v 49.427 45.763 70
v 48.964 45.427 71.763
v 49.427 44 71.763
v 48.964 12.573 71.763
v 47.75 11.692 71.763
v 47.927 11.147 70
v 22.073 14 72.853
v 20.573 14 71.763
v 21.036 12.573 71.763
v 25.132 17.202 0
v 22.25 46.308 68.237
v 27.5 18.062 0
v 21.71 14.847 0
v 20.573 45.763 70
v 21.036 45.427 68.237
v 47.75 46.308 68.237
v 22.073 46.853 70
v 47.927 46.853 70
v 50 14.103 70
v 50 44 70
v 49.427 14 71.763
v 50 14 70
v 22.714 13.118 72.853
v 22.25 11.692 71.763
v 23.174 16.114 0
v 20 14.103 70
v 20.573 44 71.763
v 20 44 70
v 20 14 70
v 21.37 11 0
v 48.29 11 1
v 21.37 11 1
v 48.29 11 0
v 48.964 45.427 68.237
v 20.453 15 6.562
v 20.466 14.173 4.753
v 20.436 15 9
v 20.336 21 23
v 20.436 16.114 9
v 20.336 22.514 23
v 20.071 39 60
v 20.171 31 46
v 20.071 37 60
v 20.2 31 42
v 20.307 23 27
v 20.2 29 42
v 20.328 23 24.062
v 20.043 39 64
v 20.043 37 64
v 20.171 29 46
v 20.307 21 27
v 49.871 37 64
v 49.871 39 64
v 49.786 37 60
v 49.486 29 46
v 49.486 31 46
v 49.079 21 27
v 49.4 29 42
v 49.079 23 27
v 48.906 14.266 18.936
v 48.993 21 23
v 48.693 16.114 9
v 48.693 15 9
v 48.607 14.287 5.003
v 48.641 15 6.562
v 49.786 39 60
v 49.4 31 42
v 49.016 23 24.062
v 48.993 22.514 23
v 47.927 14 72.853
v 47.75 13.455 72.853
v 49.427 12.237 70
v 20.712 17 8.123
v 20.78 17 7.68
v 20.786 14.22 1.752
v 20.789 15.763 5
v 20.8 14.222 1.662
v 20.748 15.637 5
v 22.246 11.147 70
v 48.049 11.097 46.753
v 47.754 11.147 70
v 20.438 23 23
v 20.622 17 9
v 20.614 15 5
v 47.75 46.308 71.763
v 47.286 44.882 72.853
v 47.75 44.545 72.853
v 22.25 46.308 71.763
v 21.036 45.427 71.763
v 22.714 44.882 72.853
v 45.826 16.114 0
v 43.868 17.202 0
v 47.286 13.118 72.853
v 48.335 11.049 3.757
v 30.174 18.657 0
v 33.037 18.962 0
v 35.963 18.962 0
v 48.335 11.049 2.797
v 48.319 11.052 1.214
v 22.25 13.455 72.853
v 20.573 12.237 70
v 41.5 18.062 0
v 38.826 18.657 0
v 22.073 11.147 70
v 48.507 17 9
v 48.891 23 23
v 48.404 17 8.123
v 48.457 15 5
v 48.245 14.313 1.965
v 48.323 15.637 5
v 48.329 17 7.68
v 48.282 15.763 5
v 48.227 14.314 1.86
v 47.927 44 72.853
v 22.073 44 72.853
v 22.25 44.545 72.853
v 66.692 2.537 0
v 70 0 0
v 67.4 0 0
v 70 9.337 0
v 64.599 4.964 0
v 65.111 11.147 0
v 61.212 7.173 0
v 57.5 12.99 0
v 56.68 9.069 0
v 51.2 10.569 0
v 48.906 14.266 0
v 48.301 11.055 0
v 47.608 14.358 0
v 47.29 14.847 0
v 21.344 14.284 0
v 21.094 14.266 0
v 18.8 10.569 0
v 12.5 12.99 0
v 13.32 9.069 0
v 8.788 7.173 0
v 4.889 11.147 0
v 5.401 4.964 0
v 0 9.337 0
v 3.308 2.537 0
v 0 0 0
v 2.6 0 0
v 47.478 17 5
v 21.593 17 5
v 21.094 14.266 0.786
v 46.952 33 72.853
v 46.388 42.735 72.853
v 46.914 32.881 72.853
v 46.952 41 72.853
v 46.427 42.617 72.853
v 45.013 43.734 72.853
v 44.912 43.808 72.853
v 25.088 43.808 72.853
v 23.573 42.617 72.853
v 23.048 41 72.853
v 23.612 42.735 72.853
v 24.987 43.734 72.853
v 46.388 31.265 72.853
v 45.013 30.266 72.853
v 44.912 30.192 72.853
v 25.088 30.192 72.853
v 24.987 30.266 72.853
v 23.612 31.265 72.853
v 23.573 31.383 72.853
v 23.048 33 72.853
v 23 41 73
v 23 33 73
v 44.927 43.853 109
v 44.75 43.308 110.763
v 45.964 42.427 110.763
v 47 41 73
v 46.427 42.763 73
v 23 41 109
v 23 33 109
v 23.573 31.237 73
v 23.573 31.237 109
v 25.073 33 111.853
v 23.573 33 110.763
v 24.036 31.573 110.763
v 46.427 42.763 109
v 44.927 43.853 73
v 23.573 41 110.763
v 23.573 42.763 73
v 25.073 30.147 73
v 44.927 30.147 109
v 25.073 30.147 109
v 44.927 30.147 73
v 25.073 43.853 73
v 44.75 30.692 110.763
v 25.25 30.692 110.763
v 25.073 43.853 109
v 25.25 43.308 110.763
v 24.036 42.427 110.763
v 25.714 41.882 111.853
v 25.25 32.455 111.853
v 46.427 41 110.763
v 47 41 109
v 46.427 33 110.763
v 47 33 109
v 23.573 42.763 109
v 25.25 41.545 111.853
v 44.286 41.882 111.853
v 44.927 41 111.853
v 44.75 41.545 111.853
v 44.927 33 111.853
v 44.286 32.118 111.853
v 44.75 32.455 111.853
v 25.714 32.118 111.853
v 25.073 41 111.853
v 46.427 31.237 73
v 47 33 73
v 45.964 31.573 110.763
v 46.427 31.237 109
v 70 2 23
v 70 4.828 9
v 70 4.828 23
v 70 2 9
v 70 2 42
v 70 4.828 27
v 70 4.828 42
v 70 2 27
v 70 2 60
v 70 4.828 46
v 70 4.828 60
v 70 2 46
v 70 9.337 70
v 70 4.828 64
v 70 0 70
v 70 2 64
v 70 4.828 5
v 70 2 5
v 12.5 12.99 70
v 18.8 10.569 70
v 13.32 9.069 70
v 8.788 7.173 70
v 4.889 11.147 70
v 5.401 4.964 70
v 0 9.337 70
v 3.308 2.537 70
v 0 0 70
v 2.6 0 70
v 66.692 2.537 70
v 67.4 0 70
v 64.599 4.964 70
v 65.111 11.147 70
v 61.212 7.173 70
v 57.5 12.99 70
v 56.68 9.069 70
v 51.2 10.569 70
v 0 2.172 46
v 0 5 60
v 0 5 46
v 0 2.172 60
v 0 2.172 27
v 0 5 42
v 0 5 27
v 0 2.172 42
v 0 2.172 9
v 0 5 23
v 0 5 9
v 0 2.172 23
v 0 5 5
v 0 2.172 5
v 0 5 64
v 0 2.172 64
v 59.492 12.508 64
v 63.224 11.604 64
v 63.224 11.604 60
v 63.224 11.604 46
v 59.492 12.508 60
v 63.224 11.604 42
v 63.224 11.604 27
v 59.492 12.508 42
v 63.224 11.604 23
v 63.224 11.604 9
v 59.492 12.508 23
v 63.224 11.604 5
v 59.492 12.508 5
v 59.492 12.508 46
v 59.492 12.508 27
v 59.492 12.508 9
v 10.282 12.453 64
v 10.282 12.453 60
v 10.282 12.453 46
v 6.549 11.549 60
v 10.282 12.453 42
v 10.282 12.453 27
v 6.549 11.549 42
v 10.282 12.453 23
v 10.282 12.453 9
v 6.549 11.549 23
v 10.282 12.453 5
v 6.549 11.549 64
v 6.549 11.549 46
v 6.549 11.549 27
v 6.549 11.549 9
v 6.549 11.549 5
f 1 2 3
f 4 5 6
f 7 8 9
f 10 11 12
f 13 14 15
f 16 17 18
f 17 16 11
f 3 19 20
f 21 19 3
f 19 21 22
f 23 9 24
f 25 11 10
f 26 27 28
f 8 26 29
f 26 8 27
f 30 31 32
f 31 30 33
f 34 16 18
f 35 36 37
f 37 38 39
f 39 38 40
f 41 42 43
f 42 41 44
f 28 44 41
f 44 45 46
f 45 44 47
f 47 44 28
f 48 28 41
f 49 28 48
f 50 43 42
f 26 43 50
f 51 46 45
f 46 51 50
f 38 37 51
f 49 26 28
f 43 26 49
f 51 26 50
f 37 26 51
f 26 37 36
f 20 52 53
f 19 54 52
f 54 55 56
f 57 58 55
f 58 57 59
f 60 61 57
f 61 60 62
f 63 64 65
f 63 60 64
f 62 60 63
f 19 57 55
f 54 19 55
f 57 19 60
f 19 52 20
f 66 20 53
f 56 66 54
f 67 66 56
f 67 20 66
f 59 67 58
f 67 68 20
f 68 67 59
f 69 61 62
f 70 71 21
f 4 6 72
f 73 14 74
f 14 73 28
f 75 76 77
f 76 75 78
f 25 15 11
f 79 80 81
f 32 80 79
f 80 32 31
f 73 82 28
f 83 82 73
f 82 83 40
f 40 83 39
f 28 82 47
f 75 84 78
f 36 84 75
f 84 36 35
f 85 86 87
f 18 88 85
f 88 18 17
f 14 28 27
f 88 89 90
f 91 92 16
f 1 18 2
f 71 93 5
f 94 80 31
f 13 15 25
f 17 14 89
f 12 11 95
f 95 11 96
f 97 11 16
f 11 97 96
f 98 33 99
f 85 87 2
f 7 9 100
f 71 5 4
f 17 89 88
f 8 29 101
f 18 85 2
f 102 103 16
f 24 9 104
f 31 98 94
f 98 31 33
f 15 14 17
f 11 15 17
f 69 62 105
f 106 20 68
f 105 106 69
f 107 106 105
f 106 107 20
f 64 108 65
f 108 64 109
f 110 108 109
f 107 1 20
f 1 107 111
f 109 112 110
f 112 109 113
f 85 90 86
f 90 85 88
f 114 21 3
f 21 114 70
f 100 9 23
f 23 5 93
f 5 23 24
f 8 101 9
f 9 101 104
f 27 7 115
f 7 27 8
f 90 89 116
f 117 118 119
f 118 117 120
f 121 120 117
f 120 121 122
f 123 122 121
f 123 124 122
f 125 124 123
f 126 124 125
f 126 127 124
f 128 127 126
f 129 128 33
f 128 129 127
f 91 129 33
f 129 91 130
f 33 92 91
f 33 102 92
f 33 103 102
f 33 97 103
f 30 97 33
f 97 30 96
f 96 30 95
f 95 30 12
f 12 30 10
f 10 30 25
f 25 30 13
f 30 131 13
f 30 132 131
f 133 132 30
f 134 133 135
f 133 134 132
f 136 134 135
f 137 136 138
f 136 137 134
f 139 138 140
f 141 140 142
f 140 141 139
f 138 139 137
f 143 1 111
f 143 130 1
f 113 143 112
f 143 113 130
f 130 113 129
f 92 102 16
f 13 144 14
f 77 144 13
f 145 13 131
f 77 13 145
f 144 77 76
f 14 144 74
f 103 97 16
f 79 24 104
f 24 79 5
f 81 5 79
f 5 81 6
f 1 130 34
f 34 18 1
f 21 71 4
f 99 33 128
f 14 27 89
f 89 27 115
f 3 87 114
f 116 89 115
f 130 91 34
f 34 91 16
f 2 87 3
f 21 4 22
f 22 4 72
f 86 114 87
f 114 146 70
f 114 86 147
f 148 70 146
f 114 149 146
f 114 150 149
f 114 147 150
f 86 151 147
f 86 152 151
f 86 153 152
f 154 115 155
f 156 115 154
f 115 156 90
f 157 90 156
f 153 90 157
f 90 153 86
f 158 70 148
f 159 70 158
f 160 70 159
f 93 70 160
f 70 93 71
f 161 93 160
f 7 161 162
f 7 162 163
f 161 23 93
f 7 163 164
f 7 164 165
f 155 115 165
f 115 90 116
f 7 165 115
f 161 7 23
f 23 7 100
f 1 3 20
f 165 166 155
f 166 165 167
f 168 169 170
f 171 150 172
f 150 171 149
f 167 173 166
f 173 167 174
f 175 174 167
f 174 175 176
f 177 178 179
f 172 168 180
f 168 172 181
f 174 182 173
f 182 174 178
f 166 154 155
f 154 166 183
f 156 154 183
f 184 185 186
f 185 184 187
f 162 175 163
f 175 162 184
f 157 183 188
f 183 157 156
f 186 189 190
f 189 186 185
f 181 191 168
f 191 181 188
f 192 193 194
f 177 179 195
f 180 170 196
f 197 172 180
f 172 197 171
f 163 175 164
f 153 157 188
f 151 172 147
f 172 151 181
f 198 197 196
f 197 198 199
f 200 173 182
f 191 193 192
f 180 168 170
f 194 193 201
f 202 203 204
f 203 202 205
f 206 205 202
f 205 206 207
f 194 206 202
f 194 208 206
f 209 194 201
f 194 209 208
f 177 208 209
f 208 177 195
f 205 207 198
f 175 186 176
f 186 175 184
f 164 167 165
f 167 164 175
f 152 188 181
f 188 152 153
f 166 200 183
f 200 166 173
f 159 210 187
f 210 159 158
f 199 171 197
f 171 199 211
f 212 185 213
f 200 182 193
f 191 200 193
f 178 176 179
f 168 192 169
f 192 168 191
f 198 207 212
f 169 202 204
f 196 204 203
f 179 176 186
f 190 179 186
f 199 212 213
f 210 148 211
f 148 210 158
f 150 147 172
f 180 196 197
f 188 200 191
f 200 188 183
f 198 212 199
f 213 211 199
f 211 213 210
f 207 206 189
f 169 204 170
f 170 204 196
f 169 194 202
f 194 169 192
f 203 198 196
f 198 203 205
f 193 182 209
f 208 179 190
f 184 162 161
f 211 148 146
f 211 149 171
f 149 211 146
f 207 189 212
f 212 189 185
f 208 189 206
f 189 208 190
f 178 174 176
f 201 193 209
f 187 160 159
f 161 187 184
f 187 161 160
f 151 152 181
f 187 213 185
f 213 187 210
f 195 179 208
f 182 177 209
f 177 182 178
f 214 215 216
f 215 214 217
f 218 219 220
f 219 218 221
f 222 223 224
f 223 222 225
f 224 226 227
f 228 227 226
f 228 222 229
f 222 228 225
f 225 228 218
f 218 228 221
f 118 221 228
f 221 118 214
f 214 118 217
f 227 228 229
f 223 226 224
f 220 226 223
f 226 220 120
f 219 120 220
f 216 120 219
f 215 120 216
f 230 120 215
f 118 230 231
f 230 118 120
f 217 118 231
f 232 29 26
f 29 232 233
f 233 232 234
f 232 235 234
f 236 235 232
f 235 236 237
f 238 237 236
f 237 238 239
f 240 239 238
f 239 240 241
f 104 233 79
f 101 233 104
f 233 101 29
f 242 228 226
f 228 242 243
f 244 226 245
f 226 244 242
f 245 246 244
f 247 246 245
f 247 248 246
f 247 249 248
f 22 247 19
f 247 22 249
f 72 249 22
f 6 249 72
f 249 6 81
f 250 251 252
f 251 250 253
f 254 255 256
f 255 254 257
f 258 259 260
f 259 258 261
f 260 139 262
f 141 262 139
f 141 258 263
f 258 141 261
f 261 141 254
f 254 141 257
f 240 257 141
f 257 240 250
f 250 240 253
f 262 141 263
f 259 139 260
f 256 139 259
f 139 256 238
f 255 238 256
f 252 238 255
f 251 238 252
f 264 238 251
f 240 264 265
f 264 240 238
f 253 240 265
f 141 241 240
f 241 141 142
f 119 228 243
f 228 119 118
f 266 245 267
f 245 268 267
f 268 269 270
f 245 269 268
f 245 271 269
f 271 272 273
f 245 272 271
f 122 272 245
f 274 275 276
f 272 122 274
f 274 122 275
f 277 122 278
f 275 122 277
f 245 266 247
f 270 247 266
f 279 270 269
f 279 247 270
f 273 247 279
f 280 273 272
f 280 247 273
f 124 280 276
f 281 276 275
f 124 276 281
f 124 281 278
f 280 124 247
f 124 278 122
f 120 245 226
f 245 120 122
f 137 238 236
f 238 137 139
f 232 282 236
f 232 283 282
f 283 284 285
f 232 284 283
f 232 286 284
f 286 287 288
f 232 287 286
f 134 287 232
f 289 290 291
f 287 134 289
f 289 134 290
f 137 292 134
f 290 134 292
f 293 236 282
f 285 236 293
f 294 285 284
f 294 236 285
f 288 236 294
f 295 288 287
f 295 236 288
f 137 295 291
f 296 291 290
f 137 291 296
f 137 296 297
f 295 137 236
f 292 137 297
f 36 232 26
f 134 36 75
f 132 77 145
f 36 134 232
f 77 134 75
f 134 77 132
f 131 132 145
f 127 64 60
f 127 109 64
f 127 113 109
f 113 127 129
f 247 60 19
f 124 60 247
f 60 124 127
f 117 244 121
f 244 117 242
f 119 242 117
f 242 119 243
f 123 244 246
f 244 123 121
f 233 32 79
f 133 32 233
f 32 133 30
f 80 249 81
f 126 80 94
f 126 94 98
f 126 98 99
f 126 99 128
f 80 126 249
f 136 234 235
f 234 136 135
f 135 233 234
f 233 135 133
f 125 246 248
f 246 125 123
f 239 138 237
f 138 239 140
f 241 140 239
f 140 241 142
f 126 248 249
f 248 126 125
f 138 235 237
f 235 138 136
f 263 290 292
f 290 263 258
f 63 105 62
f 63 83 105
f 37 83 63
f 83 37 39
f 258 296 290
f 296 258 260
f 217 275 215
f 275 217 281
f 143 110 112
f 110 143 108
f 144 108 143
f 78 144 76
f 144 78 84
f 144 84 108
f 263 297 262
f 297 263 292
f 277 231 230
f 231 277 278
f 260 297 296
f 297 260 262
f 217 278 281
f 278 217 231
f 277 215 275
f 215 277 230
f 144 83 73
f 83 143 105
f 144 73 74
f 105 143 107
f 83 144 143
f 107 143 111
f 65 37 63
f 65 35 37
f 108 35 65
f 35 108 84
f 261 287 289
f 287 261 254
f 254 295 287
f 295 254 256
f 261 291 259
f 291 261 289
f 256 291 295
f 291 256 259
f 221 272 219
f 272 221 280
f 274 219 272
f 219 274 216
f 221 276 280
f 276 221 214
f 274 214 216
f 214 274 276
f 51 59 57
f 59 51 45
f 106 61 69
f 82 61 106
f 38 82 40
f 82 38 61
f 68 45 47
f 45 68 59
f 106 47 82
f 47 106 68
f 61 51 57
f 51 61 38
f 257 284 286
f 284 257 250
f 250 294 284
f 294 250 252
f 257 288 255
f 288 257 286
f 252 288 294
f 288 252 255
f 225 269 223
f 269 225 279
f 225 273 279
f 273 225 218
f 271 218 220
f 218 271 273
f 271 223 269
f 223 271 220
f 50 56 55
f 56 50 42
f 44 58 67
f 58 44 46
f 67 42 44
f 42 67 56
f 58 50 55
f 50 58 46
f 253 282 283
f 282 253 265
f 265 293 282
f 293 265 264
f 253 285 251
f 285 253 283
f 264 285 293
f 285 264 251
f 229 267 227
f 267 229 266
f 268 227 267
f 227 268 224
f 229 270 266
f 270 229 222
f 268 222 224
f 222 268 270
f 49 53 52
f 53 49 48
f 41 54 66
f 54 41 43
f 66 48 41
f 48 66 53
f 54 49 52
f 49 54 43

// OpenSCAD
width = 66;
height = 70;


module front() {
    depth = 55;
    width = 70;
    difference() {
        intersection() {
            cube([width, depth, height]);
            translate([width/2, 0, 0]) {
                scale([3,1,1.1]) {
                    cylinder(h=height, r=15);
                }
            }
        }
        translate([width/2, 0, 0])
            scale([3,1.13,1.1])
            cylinder(h=height, r=10.8);
    }
}


module back() {
    depth = 55;
    width = 70;
    difference() {
        intersection() {
            cube([width, depth, height]);
            translate([width/2, 0, 0]) {
                scale([3,0.5,1.1]) {
                    cylinder(h=height, r=16);
                }
            }
        }
        translate([width/2, 0, 0])
        scale([3,0.5,1.1])
        cylinder(h=height, r=10.8);
    }
    translate([5, 3, 0])
        cube([width-10, 3, height]);
}

module mount() {
    width = 24;
    depth = 14;
    height = 36;
    gap = 6;


    rrr = 10;

    r = 3;


    module mount_base() {
        intersection() {
            translate([14.5, 1, 0])
                scale([1,0.5,1])
                    cylinder(h=1, r=14);
            cube([100, 100, 100]);
        }
    }
    module mount_top() {
        r=3;
        l=15;
        d=30;
        hull() {
            translate([r, r, 0])
                sphere(h=1, r=r);
            translate([(l*2) - r, r, 0])
                sphere(h=1, r=r);
            translate([0, d, 0])  {
                translate([r, r, 0])
                    sphere(h=1, r=r);
                translate([(l*2) - r, r, 0])
                    sphere(h=1, r=r);
            }
        }
    }
    module mount_insert(w, d, h, r=3) {
        module flat() {
            translate([r, r, r])
                sphere(h=1, r=r);
            translate([width-r, depth-r, r])
                sphere(h=1, r=r);
            translate([width-r, r, r])
                sphere(h=1, r=r);
            translate([r, depth-r, r])
                sphere(h=1, r=r);
        }
        hull() {
            flat();
            echo(h);
            translate([0, 0, h])
                flat();
        }
    }

    /* #cube([width, depth, height]); */
    hull() {
        mount_base();
        translate([0, 0, 70]) {
            mount_top();
        }
    }
    translate([r, 19, 70]) {
        mount_insert(width, depth, height, r);
    }


}

difference() {
    union() {
        translate([20, 11, 0])
            mount();

                front();
        translate([0, -10, ]) {
            mirror([0, 1, 0]) {
                /* back(); */
            }
        }
    }
    hole_w = 2;
    hole_h = 4;
    translate([0, 0, 5]) {
        translate([-40, -35, 0])
            rotate(-45, [0, 0, 1])
                cube([hole_w, 75, hole_h]);
        translate([107, -35, 0])
            rotate(45, [0, 0, 1])
                cube([hole_w, 75, hole_h]);
        translate([-10, 15, 0])
                cube([75, hole_w, hole_h]);
    }
    translate([0, 0, 23]) {
        translate([-40, -35, 0])
            rotate(-45, [0, 0, 1])
                cube([hole_w, 75, hole_h]);
        translate([107, -35, 0])
            rotate(45, [0, 0, 1])
                cube([hole_w, 75, hole_h]);
        translate([-10, 21, 0])
                cube([75, hole_w, hole_h]);
    }
    translate([0, 0, 42]) {
        translate([-40, -35, 0])
            rotate(-45, [0, 0, 1])
                cube([hole_w, 75, hole_h]);
        translate([107, -35, 0])
            rotate(45, [0, 0, 1])
                cube([hole_w, 75, hole_h]);
        translate([-10, 29, 0])
                cube([75, hole_w, hole_h]);
    }
    translate([0, 0, 60]) {
        translate([-40, -35, 0])
            rotate(-45, [0, 0, 1])
                cube([hole_w, 75, hole_h]);
        translate([107, -35, 0])
            rotate(45, [0, 0, 1])
                cube([hole_w, 75, hole_h]);
        translate([-10, 37, 0])
                cube([75, hole_w, hole_h]);
    }

}
